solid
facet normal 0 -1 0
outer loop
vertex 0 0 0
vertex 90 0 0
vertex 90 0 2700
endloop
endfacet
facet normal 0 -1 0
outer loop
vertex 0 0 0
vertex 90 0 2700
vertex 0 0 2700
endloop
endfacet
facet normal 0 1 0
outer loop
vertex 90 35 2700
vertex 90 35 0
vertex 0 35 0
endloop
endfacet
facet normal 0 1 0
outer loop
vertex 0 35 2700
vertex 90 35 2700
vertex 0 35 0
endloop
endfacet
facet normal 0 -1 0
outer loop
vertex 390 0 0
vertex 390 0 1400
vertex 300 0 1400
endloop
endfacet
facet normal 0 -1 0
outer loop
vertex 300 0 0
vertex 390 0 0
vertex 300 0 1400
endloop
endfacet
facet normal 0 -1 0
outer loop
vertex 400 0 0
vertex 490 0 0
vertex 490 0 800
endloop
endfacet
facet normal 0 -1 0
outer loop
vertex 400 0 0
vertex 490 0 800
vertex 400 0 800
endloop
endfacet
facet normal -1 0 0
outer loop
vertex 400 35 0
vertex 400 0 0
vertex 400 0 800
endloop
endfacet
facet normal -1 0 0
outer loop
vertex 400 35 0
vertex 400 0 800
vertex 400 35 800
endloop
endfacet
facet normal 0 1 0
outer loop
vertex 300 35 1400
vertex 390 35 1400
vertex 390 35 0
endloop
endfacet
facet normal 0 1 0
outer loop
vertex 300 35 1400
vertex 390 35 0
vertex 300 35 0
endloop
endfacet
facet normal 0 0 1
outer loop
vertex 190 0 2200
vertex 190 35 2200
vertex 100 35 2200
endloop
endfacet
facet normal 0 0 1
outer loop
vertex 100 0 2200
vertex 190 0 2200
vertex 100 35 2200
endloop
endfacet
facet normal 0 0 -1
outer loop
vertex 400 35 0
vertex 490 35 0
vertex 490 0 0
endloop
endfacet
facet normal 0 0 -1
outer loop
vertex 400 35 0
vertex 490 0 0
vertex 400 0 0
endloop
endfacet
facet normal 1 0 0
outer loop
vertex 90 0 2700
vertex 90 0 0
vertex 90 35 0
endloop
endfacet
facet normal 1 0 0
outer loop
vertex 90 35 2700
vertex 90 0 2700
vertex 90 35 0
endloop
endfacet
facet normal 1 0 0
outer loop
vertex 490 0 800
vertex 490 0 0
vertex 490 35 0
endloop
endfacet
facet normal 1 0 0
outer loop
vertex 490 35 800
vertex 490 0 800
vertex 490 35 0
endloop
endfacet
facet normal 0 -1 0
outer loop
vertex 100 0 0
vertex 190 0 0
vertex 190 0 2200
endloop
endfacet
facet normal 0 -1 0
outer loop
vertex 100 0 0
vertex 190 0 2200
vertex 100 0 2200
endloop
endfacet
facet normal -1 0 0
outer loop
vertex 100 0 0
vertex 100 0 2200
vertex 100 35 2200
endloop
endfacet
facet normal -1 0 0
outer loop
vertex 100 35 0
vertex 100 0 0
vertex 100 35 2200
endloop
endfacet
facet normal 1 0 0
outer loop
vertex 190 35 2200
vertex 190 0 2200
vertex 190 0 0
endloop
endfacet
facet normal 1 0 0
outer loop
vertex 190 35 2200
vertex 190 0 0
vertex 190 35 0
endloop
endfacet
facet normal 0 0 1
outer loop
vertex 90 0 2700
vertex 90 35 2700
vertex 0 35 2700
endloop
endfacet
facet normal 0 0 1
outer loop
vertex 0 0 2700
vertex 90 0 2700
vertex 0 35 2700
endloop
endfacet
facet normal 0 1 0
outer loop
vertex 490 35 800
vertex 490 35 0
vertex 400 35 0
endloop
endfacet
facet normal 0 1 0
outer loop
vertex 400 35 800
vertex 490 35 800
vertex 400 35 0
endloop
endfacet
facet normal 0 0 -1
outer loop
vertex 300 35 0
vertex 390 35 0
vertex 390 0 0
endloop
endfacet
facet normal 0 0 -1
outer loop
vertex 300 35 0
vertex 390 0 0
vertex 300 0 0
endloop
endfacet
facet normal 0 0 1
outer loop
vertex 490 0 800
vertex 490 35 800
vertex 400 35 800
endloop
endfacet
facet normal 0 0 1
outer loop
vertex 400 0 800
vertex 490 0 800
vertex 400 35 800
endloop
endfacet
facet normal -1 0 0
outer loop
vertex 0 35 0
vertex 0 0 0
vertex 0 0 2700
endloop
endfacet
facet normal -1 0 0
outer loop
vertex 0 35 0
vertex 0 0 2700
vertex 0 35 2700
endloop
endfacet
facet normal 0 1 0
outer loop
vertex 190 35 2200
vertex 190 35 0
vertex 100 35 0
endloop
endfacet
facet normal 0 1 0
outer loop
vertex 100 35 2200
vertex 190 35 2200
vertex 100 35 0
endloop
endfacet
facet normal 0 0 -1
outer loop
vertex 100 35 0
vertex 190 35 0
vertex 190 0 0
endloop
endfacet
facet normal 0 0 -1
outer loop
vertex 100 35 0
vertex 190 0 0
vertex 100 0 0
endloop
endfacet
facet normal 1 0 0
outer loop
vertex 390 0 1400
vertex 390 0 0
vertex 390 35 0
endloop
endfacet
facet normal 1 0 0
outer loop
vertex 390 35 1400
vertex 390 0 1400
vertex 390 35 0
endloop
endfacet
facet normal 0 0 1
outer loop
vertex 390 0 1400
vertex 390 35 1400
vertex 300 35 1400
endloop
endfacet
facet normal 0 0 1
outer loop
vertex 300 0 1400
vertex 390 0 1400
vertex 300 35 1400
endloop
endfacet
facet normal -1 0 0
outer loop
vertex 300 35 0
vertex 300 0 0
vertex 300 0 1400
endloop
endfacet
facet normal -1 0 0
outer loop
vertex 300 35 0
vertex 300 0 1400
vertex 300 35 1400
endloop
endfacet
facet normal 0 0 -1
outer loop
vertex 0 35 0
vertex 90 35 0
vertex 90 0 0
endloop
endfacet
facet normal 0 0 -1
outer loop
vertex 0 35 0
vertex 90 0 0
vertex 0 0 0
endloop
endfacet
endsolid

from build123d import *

# Parameters (mm, degrees)
F0_W     = 70
F0_H     = 35
F1_DEPTH = 2700
F2_DEPTH = 2200
F3_DEPTH = 1400
F4_DEPTH = 800


# Not quite as in the source:
# - a pattern or mirror of a feature is missing from the dataset's text; its kind, count and spacing are read off the source's solid


with BuildPart() as f1:
    # F0 (on Top) → F1 (new body)
    with BuildSketch(Plane.XY):
        with Locations((35, 17.5)):
            Rectangle(F0_W, F0_H)
    extrude(amount=F1_DEPTH)

    # F1_copies: F1 across plane


with BuildPart() as f1_1:
    add(f1.part)
    add(f1.part.mirror(Plane(origin=(45, 0, 0), x_dir=(0, 0, 1), z_dir=(1, 0, 0))))


with BuildPart() as f2:
    # F0 (on Top) → F2 (new body)
    with BuildSketch(Plane.XY):
        with Locations((135, 17.5)):
            Rectangle(F0_W, F0_H)
    extrude(amount=F2_DEPTH)

    # F2_copies: F2 across plane


with BuildPart() as f2_1:
    add(f2.part)
    add(f2.part.mirror(Plane(origin=(145, 0, 0), x_dir=(0, 0, 1), z_dir=(1, 0, 0))))


with BuildPart() as f3:
    # F0 (on Top) → F3 (new body)
    with BuildSketch(Plane.XY):
        with Locations((335, 17.5)):
            Rectangle(F0_W, F0_H)
    extrude(amount=F3_DEPTH)

    # F3_copies: F3 across plane


with BuildPart() as f3_1:
    add(f3.part)
    add(f3.part.mirror(Plane(origin=(345, 0, 0), x_dir=(0, 0, 1), z_dir=(1, 0, 0))))


with BuildPart() as f4:
    # F0 (on Top) → F4 (new body)
    with BuildSketch(Plane.XY):
        with Locations((435, 17.5)):
            Rectangle(F0_W, F0_H)
    extrude(amount=F4_DEPTH)

    # F4_copies: F4 across plane


with BuildPart() as f4_1:
    add(f4.part)
    add(f4.part.mirror(Plane(origin=(445, 0, 0), x_dir=(0, 0, 1), z_dir=(1, 0, 0))))


solid = Compound([f1_1.part, f2_1.part, f3_1.part, f4_1.part])
